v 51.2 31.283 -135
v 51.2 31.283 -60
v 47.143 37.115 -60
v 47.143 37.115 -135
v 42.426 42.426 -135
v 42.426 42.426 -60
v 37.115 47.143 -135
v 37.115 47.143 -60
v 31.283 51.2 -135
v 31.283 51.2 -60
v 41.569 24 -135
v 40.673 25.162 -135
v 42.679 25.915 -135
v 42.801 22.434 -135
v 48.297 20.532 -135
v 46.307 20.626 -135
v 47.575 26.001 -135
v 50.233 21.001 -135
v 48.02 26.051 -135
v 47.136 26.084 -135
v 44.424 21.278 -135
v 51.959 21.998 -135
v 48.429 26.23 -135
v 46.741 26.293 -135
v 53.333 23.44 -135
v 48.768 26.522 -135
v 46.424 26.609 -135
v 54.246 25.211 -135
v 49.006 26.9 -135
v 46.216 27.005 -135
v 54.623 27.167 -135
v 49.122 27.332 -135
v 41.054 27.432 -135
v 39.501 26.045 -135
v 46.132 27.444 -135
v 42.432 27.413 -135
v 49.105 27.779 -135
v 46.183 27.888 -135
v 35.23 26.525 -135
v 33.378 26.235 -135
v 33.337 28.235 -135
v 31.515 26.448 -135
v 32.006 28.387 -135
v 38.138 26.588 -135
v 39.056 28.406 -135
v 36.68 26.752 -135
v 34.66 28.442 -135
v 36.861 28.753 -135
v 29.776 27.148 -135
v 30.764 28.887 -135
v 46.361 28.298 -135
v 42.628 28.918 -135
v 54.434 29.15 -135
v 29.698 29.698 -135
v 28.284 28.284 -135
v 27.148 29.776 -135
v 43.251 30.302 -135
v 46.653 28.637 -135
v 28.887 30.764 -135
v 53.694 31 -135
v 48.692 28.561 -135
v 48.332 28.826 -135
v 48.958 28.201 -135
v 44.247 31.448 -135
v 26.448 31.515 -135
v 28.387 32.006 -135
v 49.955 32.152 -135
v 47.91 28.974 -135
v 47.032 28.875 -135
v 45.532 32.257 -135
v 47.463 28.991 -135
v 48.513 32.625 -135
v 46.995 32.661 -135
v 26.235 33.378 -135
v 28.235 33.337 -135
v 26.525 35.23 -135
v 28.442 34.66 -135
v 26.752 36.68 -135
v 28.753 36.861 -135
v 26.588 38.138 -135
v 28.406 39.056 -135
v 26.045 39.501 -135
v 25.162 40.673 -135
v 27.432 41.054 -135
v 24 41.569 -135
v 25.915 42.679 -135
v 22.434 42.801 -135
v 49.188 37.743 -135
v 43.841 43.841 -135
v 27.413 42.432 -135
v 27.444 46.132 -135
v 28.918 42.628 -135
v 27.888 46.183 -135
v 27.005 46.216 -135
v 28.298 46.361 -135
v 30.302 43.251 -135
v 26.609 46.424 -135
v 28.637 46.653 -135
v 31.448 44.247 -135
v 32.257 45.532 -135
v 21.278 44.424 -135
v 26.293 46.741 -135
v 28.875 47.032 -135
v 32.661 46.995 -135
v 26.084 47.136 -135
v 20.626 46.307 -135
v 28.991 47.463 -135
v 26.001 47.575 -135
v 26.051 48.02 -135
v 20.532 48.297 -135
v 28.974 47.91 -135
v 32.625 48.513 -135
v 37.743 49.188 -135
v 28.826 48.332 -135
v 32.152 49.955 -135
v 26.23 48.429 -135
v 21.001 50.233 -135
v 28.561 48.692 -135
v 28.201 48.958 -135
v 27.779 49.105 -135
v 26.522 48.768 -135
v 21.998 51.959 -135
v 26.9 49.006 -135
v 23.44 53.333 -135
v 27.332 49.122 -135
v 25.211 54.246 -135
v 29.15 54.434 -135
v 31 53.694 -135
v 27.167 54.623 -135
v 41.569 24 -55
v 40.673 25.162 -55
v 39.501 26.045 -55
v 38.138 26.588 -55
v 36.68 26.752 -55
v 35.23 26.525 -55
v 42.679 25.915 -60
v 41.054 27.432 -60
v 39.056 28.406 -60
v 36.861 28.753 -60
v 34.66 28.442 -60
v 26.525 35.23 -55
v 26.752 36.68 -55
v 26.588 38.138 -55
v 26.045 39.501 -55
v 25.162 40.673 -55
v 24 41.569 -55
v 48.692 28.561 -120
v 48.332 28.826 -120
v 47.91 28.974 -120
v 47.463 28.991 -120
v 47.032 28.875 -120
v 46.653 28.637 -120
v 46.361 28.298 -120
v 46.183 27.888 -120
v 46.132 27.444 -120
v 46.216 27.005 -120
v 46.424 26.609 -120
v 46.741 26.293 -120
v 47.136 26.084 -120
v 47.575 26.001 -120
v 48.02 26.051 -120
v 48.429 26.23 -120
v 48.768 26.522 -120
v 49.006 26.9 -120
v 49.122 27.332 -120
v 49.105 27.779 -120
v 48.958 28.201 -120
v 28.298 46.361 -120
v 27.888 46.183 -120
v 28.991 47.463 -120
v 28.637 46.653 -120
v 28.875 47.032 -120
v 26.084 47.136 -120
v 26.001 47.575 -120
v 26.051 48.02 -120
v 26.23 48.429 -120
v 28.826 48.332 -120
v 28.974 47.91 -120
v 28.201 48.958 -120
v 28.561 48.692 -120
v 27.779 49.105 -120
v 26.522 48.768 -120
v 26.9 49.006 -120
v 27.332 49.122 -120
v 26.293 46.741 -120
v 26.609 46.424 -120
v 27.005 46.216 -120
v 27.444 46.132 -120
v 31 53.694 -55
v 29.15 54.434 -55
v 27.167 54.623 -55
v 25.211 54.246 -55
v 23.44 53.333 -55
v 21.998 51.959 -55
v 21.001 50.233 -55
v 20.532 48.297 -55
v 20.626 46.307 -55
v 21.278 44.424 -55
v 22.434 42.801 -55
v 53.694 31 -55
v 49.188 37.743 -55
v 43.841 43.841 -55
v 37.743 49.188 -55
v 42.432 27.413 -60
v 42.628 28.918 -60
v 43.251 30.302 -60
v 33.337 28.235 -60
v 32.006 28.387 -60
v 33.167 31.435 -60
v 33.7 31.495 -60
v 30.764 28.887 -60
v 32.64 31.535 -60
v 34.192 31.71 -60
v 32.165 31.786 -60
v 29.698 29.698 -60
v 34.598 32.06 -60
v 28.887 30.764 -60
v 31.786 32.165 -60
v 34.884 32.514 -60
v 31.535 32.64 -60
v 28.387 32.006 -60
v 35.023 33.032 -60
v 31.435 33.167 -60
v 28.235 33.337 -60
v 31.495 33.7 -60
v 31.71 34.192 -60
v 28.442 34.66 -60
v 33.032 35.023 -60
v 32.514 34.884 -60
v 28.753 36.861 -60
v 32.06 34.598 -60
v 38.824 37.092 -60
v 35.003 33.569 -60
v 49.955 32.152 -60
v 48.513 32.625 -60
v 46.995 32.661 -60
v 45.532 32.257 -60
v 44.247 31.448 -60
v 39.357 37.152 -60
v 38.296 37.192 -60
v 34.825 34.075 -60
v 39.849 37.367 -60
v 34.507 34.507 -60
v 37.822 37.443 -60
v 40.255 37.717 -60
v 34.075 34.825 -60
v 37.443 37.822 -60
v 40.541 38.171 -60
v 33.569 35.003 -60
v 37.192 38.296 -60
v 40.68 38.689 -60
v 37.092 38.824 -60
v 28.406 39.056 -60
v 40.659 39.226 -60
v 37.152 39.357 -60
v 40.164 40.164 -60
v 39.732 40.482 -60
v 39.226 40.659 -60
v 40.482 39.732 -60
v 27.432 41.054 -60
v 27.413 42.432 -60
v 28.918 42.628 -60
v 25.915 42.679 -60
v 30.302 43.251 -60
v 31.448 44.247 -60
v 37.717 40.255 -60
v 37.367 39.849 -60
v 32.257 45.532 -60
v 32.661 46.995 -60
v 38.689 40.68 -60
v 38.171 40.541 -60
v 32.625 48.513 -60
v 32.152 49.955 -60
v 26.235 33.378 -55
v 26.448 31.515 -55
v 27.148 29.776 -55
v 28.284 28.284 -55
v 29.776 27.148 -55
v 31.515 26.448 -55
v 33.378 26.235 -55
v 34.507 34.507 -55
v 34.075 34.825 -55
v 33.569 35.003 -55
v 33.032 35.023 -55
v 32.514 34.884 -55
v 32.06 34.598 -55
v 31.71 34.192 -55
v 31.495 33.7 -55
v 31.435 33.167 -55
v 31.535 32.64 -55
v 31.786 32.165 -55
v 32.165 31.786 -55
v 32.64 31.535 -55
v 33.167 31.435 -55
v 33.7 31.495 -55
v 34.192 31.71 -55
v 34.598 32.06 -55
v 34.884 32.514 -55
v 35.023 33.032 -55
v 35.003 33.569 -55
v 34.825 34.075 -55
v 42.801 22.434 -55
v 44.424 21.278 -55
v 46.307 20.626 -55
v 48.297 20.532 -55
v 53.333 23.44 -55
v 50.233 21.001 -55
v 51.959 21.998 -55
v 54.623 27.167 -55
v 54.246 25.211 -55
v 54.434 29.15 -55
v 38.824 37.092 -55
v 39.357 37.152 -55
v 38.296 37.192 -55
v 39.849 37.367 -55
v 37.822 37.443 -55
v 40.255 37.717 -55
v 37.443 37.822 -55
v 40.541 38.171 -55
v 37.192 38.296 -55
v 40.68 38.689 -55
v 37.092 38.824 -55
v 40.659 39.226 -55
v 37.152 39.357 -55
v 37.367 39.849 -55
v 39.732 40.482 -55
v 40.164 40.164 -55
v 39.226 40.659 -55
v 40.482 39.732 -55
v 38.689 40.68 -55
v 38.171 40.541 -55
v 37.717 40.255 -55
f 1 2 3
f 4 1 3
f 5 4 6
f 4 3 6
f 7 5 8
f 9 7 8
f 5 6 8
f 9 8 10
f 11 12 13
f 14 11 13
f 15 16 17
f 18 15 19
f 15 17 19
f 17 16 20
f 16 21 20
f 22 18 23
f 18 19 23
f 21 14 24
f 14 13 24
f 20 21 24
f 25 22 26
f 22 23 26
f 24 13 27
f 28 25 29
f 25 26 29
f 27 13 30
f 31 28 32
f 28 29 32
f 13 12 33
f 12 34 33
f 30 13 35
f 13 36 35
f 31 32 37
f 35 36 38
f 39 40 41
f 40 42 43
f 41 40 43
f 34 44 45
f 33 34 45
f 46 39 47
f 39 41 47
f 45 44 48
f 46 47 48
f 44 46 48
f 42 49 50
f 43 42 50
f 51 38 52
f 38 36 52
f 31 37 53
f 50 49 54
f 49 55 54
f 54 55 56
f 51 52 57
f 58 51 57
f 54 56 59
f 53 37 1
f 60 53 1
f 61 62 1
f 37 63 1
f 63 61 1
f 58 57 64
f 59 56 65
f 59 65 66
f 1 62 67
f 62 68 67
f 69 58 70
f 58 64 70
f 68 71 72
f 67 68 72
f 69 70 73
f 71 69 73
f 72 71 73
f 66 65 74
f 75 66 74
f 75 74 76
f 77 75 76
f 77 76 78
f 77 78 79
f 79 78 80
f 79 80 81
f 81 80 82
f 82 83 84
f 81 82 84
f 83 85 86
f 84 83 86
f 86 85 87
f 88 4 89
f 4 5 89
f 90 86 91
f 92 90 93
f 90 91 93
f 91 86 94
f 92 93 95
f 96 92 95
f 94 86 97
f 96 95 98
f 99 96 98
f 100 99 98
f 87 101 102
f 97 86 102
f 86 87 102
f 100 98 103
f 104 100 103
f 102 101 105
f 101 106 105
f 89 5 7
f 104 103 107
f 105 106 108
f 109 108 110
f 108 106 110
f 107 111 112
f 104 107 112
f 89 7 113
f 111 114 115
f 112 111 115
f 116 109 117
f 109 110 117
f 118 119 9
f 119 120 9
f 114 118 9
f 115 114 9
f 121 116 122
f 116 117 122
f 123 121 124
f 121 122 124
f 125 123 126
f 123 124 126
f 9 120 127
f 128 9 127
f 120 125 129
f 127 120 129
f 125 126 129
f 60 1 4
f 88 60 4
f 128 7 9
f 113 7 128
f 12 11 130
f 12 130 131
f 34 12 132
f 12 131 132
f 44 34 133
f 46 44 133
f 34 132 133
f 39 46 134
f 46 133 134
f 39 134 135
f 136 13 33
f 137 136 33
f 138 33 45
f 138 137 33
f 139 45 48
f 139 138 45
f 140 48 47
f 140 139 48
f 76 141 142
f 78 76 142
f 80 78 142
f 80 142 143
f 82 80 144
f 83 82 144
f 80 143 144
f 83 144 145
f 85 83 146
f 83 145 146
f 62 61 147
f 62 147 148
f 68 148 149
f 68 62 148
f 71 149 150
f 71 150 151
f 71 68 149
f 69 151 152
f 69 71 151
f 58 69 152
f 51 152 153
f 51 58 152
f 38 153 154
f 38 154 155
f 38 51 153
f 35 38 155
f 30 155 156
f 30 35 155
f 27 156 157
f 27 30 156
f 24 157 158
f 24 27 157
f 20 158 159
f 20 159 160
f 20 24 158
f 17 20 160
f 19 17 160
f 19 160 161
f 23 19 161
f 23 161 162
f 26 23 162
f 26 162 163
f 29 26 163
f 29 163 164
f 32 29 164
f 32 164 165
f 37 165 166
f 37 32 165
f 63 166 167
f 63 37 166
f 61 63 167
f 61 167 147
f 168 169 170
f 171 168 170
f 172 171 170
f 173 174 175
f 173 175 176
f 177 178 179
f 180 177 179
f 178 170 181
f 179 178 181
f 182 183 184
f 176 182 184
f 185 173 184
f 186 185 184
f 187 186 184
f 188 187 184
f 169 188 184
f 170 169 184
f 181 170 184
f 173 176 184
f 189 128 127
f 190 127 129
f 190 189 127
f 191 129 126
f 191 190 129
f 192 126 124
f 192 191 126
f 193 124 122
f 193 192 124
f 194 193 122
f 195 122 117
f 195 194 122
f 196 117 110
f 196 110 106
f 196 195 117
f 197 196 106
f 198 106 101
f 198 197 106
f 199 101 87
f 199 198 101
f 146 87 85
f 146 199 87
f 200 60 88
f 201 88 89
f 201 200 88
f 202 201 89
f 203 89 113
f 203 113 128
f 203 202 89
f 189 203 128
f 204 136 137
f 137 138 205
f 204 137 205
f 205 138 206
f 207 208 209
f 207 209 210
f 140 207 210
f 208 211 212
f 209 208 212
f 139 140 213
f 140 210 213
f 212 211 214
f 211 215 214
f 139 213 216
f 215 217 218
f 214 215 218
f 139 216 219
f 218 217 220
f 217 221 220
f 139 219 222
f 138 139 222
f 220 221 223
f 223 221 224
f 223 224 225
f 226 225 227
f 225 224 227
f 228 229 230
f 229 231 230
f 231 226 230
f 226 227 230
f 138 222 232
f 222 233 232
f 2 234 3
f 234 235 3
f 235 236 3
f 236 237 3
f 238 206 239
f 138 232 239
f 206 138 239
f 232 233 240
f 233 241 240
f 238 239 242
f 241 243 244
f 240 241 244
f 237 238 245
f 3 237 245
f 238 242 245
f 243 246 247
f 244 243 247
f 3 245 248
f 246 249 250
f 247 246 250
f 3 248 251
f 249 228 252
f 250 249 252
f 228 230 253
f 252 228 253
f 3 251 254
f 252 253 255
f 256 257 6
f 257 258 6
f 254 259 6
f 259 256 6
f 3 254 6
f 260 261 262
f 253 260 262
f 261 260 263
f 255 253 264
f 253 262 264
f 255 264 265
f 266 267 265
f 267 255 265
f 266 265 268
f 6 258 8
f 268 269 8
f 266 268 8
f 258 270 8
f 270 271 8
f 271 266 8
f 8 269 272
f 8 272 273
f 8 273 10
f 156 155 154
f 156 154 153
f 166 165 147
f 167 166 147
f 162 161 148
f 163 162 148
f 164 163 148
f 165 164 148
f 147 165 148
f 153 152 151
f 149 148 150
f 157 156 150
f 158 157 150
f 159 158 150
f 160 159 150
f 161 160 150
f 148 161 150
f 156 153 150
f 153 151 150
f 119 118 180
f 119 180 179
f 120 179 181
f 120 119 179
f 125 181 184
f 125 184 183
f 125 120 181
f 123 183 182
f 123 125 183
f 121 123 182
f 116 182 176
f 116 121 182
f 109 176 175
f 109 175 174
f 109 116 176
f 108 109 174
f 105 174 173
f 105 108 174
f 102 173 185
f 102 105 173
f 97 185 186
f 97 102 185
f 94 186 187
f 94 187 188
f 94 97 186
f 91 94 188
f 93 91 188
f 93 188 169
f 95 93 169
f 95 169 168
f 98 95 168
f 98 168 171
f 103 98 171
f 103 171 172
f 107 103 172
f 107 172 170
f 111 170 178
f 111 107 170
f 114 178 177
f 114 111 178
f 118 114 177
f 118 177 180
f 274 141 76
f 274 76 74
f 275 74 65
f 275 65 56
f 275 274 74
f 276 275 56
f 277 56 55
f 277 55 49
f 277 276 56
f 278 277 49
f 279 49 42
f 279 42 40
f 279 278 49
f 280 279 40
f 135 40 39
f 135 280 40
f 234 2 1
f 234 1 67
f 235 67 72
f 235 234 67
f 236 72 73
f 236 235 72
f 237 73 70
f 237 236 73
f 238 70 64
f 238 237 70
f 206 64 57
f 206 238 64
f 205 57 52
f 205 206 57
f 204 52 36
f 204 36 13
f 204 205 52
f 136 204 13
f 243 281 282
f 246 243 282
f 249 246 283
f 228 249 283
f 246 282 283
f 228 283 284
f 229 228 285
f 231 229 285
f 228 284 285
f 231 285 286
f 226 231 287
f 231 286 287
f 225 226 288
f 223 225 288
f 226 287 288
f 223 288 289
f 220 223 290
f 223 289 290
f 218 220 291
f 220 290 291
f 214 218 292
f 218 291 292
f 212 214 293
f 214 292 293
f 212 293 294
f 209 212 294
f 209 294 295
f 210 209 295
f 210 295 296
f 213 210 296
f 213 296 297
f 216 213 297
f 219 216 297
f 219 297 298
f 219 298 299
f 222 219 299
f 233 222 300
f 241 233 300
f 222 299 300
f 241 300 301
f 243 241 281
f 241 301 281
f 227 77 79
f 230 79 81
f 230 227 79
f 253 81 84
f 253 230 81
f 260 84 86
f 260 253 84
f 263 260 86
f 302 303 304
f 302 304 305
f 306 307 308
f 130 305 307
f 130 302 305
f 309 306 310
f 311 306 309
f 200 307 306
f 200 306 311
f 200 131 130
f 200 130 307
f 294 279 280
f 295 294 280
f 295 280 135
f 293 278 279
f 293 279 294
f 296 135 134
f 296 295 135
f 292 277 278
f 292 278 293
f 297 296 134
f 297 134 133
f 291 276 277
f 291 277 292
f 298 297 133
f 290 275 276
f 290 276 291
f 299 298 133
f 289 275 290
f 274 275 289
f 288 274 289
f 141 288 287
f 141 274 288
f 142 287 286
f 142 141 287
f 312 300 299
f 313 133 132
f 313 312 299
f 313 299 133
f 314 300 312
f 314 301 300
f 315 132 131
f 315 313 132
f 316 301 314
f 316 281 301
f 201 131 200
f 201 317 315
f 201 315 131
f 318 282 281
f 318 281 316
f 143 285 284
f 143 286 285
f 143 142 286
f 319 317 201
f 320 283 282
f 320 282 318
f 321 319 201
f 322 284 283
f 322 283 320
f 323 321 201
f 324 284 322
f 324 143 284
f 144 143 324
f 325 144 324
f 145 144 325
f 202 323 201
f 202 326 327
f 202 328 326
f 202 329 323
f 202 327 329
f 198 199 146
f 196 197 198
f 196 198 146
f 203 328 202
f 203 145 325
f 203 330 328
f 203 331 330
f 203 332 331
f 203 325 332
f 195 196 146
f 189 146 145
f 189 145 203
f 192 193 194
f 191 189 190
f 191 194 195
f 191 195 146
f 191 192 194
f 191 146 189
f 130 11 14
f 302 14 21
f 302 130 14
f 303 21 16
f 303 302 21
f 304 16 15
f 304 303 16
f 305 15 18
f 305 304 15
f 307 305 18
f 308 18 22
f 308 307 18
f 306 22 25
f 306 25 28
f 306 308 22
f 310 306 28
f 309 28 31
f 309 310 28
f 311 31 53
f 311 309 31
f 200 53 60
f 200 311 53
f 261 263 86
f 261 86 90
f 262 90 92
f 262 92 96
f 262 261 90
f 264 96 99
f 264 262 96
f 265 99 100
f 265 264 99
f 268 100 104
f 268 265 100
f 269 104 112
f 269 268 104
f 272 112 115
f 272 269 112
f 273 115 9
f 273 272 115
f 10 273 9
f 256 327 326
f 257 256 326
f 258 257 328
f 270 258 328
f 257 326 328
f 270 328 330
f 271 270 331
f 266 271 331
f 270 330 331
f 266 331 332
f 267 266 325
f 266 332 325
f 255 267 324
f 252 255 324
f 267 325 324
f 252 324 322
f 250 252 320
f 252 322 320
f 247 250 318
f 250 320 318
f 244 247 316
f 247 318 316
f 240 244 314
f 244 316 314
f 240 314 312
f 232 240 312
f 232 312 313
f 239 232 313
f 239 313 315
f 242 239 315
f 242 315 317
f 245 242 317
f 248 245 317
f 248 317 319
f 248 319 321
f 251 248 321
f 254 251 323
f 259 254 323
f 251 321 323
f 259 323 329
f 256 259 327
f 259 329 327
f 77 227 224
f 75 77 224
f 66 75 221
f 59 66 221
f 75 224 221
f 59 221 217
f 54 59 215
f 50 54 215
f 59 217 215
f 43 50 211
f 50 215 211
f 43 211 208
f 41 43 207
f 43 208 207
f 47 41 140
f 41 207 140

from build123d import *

# Parameters (mm, degrees)
SKETCH032_R             = 1.8
PAD023_DEPTH            = 5
PAD024_DEPTH            = 80
SKETCH031_R             = 5.2
PAD022_DEPTH            = 80
SKETCH029_R             = 1.5
POCKET006_DEPTH         = 15
BODY004_PLACEMENT_ANGLE = 45


with BuildPart() as part:
    # Sketch032 → Pad023 (new body)
    with BuildSketch(Plane.XY):
        with BuildLine():
            ThreePointArc((59.887401, -16.046781), (62, 0), (59.887401, 16.046781))
            ThreePointArc((59.887401, 16.046781), (51.314187, 20.996528), (46.36444, 12.423314))
            ThreePointArc((43.66723, 6.1557), (46.103592, 8.821401), (46.36444, 12.423314))
            ThreePointArc((43.66723, 6.1557), (40, 0), (43.66723, -6.1557))
            ThreePointArc((46.36444, -12.423314), (46.103592, -8.821401), (43.66723, -6.1557))
            ThreePointArc((46.36444, -12.423314), (51.314187, -20.996528), (59.887401, -16.046781))
        make_face()
        with Locations((47, 0)):
            Circle(SKETCH032_R, mode=Mode.SUBTRACT)
        with Locations((55, 0)):
            Circle(SKETCH032_R, mode=Mode.SUBTRACT)
    extrude(amount=-PAD023_DEPTH)

    # Sketch033 → Pad024 (join)
    with BuildSketch(Plane.XY):
        with BuildLine():
            ThreePointArc((59.887401, -16.046781), (62, 0), (59.887401, 16.046781))
            ThreePointArc((59.887401, 16.046781), (51.314187, 20.996528), (46.36444, 12.423314))
            ThreePointArc((43.66723, 6.1557), (46.103592, 8.821401), (46.36444, 12.423314))
            ThreePointArc((43.66723, 6.1557), (40, 0), (43.66723, -6.1557))
            ThreePointArc((46.36444, -12.423314), (46.103592, -8.821401), (43.66723, -6.1557))
            ThreePointArc((46.36444, -12.423314), (51.314187, -20.996528), (59.887401, -16.046781))
        make_face()
        with BuildLine():
            ThreePointArc((57.95555, 15.529143), (51.831825, 19.064677), (48.296291, 12.940952))
            ThreePointArc((44.61945, 4.396929), (47.940703, 8.030817), (48.296291, 12.940952))
            ThreePointArc((44.61945, 4.396929), (42, 0), (44.61945, -4.396929))
            ThreePointArc((48.296291, -12.940952), (47.940703, -8.030817), (44.61945, -4.396929))
            ThreePointArc((48.296291, -12.940952), (51.831825, -19.064677), (57.95555, -15.529143))
            ThreePointArc((57.95555, -15.529143), (60, 0), (57.95555, 15.529143))
        make_face(mode=Mode.SUBTRACT)
    extrude(amount=-PAD024_DEPTH)

    # Sketch031 → Pad022 (join)
    with BuildSketch(Plane.XY):
        with Locations((53.12592, 14.235047)):
            Circle(SKETCH031_R)
        with Locations((53.12592, -14.235047)):
            Circle(SKETCH031_R)
    extrude(amount=-PAD022_DEPTH)

    # Sketch029 → Pocket006 (cut)
    with BuildSketch(Plane.XY.offset(-80)):
        with Locations((53.12592, 14.235047)):
            Circle(SKETCH029_R)
        with Locations((53.12592, -14.235047)):
            Circle(SKETCH029_R)
    extrude(amount=POCKET006_DEPTH, mode=Mode.SUBTRACT)


with BuildPart() as part_1:
    # Body004 placement: moved
    add(part.part.moved(Location((0, 0, -55))).rotate(Axis((0, 0, -55), (0, 0, 1)), BODY004_PLACEMENT_ANGLE))


solid = part_1.part
